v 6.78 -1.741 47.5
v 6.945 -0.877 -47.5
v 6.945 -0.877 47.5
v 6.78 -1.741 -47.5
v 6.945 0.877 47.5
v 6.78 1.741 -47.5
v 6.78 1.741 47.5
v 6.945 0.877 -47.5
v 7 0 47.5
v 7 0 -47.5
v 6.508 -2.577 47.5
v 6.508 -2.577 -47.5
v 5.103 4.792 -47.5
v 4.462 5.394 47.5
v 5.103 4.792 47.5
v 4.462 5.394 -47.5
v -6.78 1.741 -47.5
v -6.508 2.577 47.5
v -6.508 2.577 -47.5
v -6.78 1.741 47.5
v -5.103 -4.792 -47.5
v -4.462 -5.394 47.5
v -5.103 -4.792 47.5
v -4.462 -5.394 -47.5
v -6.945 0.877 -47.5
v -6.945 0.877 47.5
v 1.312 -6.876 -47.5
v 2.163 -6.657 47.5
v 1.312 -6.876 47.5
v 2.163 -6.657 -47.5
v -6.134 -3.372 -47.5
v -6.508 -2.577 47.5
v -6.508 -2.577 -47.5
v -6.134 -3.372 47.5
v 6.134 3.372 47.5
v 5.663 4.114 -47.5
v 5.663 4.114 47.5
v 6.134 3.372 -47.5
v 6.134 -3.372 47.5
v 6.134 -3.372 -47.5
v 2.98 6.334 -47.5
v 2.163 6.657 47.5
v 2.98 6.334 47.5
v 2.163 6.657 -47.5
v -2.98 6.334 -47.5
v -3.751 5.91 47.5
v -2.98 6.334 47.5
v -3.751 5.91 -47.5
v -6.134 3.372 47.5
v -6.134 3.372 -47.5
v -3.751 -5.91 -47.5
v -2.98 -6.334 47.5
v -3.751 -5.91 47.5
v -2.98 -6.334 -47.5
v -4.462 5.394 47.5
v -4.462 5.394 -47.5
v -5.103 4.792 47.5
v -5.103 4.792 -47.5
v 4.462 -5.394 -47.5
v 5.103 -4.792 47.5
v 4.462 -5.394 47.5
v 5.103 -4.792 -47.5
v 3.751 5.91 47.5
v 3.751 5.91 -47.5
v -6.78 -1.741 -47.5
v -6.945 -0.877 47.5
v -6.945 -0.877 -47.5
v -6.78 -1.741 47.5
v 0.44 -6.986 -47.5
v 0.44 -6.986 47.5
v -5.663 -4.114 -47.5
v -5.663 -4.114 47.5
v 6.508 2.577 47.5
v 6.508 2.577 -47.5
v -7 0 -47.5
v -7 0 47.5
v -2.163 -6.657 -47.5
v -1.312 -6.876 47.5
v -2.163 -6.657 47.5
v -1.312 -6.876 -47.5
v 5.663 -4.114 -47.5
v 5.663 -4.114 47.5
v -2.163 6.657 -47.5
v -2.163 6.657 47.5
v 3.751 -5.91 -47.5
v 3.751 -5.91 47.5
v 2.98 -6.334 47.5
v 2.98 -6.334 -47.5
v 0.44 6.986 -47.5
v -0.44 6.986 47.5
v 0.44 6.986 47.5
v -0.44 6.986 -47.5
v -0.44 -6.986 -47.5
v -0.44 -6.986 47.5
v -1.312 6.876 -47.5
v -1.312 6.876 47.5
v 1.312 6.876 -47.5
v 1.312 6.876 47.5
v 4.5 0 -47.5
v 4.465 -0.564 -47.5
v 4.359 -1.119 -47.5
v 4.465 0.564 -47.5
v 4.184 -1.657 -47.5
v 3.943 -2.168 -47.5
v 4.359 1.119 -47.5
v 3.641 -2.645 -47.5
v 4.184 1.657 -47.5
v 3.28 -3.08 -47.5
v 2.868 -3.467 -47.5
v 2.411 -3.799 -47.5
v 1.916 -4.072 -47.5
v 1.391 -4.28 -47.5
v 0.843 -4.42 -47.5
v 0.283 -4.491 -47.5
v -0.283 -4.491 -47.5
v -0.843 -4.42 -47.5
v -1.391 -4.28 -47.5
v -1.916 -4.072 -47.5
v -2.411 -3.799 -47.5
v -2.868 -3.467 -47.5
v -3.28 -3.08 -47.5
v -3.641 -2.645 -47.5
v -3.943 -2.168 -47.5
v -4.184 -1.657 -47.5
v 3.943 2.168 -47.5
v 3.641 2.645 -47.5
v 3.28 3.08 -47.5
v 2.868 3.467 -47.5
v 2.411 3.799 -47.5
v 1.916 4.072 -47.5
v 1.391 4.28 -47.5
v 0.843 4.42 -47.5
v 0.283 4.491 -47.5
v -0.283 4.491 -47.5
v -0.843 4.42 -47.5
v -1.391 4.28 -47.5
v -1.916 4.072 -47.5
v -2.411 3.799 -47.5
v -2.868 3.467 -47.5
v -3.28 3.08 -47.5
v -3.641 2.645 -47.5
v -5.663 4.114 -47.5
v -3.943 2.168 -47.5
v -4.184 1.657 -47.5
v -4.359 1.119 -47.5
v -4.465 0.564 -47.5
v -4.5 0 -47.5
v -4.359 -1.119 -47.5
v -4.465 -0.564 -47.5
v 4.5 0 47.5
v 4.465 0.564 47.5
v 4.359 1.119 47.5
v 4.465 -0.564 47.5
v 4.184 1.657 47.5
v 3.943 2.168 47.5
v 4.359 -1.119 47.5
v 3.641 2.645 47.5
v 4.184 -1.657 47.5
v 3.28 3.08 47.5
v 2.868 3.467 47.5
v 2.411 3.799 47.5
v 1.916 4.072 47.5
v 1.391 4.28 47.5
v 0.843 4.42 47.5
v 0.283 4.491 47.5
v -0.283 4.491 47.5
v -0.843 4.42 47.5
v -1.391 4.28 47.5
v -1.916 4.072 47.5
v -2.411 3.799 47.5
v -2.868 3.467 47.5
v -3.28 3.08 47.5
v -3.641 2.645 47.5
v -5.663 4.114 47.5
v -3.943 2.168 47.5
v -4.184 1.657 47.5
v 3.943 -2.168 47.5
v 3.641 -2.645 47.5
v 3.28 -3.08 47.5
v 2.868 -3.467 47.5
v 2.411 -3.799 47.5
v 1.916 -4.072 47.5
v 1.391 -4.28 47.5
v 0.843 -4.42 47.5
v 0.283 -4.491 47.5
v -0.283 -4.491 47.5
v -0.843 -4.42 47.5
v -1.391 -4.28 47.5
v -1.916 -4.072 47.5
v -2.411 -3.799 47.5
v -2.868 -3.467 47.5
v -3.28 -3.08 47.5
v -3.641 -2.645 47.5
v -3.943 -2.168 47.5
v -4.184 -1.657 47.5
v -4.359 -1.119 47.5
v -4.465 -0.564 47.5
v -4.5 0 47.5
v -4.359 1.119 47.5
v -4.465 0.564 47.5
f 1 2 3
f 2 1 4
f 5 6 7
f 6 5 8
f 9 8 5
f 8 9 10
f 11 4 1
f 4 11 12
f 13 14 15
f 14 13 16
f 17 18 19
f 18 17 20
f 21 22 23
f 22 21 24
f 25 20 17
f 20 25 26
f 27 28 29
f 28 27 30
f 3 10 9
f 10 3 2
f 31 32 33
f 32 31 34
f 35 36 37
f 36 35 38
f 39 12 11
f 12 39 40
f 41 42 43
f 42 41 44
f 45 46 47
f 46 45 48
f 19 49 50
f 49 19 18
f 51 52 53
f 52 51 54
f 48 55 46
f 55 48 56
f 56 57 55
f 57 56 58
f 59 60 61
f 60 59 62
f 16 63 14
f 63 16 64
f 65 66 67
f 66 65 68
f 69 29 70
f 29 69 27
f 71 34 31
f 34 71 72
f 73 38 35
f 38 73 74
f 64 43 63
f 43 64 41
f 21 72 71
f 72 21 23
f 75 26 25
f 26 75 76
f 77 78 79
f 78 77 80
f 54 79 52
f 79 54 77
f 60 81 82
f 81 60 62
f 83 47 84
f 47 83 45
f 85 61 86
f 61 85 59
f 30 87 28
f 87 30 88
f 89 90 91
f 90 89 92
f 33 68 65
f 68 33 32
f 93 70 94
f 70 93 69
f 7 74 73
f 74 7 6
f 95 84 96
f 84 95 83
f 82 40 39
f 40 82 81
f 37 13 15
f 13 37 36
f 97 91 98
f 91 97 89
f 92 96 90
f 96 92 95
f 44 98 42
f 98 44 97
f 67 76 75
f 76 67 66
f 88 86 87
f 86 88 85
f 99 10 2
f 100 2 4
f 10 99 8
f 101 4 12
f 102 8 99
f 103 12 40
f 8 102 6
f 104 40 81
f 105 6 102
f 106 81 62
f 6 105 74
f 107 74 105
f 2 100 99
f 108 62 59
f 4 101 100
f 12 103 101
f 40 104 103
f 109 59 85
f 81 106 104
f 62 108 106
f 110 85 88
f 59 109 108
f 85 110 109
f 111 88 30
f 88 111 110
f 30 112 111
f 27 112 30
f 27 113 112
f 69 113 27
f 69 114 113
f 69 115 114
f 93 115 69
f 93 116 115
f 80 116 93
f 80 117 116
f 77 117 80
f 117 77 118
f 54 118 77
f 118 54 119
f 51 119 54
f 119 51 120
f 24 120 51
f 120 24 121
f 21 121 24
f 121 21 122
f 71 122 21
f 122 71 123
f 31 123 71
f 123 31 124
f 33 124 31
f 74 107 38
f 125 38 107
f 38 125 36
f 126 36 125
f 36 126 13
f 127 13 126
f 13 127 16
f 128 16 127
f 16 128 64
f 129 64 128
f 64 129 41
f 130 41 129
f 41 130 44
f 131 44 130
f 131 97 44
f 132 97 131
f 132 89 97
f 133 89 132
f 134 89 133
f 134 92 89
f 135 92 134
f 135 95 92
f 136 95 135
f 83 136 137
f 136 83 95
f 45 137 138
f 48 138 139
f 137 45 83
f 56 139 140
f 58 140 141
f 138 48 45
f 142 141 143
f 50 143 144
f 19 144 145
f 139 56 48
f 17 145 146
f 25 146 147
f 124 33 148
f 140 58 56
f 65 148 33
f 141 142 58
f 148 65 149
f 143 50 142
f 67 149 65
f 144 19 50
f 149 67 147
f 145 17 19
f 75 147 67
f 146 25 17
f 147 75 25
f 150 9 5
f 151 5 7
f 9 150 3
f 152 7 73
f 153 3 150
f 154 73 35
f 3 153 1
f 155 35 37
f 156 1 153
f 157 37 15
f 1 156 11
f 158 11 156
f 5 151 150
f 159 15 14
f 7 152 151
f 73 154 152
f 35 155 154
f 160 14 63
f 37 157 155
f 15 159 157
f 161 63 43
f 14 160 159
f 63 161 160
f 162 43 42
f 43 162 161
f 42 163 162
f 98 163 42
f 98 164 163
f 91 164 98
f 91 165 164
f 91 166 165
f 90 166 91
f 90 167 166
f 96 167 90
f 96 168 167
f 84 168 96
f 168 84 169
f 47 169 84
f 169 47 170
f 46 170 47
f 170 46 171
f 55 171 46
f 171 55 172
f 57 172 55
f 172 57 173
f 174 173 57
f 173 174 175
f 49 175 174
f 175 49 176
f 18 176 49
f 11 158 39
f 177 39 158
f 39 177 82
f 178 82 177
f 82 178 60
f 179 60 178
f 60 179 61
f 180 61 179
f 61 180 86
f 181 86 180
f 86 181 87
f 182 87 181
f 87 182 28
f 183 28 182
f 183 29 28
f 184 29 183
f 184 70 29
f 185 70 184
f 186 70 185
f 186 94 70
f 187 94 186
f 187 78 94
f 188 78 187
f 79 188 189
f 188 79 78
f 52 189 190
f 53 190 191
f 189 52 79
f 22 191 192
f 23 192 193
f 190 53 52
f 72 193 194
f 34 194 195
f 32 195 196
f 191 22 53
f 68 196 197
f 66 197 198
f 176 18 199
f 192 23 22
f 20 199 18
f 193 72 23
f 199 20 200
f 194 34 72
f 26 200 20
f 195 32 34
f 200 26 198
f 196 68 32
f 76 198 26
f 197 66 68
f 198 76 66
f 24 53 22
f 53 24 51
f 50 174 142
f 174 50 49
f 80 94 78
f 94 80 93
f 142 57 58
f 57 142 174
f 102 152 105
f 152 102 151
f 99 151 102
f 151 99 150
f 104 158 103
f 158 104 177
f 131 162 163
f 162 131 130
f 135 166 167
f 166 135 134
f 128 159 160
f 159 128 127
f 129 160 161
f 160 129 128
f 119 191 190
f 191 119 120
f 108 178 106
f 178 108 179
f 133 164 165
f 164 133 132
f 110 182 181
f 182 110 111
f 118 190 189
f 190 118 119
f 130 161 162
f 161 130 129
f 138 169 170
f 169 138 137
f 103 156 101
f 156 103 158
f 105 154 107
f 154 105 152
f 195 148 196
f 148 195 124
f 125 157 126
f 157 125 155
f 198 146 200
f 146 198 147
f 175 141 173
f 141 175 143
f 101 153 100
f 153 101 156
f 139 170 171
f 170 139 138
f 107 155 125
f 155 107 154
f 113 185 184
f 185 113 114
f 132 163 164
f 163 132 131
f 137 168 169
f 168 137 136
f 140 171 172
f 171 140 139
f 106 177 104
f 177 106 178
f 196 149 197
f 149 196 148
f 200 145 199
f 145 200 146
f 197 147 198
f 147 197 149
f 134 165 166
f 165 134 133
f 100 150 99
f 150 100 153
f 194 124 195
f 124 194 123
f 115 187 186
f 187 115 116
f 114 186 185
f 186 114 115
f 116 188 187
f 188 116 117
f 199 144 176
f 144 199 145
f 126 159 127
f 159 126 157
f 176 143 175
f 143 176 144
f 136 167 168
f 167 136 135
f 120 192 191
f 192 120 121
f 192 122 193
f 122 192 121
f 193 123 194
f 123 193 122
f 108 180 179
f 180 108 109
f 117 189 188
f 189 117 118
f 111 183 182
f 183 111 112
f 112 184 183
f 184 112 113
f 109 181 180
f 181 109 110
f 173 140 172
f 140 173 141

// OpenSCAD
$fn = 50;


difference() {
	union() {
		translate(v = [0, 0, -47.5000000000]) {
			cylinder(h = 95, r = 7.0000000000);
		}
	}
	union() {
		translate(v = [0, 0, -100.0000000000]) {
			cylinder(h = 200, r = 4.5000000000);
		}
	}
}
